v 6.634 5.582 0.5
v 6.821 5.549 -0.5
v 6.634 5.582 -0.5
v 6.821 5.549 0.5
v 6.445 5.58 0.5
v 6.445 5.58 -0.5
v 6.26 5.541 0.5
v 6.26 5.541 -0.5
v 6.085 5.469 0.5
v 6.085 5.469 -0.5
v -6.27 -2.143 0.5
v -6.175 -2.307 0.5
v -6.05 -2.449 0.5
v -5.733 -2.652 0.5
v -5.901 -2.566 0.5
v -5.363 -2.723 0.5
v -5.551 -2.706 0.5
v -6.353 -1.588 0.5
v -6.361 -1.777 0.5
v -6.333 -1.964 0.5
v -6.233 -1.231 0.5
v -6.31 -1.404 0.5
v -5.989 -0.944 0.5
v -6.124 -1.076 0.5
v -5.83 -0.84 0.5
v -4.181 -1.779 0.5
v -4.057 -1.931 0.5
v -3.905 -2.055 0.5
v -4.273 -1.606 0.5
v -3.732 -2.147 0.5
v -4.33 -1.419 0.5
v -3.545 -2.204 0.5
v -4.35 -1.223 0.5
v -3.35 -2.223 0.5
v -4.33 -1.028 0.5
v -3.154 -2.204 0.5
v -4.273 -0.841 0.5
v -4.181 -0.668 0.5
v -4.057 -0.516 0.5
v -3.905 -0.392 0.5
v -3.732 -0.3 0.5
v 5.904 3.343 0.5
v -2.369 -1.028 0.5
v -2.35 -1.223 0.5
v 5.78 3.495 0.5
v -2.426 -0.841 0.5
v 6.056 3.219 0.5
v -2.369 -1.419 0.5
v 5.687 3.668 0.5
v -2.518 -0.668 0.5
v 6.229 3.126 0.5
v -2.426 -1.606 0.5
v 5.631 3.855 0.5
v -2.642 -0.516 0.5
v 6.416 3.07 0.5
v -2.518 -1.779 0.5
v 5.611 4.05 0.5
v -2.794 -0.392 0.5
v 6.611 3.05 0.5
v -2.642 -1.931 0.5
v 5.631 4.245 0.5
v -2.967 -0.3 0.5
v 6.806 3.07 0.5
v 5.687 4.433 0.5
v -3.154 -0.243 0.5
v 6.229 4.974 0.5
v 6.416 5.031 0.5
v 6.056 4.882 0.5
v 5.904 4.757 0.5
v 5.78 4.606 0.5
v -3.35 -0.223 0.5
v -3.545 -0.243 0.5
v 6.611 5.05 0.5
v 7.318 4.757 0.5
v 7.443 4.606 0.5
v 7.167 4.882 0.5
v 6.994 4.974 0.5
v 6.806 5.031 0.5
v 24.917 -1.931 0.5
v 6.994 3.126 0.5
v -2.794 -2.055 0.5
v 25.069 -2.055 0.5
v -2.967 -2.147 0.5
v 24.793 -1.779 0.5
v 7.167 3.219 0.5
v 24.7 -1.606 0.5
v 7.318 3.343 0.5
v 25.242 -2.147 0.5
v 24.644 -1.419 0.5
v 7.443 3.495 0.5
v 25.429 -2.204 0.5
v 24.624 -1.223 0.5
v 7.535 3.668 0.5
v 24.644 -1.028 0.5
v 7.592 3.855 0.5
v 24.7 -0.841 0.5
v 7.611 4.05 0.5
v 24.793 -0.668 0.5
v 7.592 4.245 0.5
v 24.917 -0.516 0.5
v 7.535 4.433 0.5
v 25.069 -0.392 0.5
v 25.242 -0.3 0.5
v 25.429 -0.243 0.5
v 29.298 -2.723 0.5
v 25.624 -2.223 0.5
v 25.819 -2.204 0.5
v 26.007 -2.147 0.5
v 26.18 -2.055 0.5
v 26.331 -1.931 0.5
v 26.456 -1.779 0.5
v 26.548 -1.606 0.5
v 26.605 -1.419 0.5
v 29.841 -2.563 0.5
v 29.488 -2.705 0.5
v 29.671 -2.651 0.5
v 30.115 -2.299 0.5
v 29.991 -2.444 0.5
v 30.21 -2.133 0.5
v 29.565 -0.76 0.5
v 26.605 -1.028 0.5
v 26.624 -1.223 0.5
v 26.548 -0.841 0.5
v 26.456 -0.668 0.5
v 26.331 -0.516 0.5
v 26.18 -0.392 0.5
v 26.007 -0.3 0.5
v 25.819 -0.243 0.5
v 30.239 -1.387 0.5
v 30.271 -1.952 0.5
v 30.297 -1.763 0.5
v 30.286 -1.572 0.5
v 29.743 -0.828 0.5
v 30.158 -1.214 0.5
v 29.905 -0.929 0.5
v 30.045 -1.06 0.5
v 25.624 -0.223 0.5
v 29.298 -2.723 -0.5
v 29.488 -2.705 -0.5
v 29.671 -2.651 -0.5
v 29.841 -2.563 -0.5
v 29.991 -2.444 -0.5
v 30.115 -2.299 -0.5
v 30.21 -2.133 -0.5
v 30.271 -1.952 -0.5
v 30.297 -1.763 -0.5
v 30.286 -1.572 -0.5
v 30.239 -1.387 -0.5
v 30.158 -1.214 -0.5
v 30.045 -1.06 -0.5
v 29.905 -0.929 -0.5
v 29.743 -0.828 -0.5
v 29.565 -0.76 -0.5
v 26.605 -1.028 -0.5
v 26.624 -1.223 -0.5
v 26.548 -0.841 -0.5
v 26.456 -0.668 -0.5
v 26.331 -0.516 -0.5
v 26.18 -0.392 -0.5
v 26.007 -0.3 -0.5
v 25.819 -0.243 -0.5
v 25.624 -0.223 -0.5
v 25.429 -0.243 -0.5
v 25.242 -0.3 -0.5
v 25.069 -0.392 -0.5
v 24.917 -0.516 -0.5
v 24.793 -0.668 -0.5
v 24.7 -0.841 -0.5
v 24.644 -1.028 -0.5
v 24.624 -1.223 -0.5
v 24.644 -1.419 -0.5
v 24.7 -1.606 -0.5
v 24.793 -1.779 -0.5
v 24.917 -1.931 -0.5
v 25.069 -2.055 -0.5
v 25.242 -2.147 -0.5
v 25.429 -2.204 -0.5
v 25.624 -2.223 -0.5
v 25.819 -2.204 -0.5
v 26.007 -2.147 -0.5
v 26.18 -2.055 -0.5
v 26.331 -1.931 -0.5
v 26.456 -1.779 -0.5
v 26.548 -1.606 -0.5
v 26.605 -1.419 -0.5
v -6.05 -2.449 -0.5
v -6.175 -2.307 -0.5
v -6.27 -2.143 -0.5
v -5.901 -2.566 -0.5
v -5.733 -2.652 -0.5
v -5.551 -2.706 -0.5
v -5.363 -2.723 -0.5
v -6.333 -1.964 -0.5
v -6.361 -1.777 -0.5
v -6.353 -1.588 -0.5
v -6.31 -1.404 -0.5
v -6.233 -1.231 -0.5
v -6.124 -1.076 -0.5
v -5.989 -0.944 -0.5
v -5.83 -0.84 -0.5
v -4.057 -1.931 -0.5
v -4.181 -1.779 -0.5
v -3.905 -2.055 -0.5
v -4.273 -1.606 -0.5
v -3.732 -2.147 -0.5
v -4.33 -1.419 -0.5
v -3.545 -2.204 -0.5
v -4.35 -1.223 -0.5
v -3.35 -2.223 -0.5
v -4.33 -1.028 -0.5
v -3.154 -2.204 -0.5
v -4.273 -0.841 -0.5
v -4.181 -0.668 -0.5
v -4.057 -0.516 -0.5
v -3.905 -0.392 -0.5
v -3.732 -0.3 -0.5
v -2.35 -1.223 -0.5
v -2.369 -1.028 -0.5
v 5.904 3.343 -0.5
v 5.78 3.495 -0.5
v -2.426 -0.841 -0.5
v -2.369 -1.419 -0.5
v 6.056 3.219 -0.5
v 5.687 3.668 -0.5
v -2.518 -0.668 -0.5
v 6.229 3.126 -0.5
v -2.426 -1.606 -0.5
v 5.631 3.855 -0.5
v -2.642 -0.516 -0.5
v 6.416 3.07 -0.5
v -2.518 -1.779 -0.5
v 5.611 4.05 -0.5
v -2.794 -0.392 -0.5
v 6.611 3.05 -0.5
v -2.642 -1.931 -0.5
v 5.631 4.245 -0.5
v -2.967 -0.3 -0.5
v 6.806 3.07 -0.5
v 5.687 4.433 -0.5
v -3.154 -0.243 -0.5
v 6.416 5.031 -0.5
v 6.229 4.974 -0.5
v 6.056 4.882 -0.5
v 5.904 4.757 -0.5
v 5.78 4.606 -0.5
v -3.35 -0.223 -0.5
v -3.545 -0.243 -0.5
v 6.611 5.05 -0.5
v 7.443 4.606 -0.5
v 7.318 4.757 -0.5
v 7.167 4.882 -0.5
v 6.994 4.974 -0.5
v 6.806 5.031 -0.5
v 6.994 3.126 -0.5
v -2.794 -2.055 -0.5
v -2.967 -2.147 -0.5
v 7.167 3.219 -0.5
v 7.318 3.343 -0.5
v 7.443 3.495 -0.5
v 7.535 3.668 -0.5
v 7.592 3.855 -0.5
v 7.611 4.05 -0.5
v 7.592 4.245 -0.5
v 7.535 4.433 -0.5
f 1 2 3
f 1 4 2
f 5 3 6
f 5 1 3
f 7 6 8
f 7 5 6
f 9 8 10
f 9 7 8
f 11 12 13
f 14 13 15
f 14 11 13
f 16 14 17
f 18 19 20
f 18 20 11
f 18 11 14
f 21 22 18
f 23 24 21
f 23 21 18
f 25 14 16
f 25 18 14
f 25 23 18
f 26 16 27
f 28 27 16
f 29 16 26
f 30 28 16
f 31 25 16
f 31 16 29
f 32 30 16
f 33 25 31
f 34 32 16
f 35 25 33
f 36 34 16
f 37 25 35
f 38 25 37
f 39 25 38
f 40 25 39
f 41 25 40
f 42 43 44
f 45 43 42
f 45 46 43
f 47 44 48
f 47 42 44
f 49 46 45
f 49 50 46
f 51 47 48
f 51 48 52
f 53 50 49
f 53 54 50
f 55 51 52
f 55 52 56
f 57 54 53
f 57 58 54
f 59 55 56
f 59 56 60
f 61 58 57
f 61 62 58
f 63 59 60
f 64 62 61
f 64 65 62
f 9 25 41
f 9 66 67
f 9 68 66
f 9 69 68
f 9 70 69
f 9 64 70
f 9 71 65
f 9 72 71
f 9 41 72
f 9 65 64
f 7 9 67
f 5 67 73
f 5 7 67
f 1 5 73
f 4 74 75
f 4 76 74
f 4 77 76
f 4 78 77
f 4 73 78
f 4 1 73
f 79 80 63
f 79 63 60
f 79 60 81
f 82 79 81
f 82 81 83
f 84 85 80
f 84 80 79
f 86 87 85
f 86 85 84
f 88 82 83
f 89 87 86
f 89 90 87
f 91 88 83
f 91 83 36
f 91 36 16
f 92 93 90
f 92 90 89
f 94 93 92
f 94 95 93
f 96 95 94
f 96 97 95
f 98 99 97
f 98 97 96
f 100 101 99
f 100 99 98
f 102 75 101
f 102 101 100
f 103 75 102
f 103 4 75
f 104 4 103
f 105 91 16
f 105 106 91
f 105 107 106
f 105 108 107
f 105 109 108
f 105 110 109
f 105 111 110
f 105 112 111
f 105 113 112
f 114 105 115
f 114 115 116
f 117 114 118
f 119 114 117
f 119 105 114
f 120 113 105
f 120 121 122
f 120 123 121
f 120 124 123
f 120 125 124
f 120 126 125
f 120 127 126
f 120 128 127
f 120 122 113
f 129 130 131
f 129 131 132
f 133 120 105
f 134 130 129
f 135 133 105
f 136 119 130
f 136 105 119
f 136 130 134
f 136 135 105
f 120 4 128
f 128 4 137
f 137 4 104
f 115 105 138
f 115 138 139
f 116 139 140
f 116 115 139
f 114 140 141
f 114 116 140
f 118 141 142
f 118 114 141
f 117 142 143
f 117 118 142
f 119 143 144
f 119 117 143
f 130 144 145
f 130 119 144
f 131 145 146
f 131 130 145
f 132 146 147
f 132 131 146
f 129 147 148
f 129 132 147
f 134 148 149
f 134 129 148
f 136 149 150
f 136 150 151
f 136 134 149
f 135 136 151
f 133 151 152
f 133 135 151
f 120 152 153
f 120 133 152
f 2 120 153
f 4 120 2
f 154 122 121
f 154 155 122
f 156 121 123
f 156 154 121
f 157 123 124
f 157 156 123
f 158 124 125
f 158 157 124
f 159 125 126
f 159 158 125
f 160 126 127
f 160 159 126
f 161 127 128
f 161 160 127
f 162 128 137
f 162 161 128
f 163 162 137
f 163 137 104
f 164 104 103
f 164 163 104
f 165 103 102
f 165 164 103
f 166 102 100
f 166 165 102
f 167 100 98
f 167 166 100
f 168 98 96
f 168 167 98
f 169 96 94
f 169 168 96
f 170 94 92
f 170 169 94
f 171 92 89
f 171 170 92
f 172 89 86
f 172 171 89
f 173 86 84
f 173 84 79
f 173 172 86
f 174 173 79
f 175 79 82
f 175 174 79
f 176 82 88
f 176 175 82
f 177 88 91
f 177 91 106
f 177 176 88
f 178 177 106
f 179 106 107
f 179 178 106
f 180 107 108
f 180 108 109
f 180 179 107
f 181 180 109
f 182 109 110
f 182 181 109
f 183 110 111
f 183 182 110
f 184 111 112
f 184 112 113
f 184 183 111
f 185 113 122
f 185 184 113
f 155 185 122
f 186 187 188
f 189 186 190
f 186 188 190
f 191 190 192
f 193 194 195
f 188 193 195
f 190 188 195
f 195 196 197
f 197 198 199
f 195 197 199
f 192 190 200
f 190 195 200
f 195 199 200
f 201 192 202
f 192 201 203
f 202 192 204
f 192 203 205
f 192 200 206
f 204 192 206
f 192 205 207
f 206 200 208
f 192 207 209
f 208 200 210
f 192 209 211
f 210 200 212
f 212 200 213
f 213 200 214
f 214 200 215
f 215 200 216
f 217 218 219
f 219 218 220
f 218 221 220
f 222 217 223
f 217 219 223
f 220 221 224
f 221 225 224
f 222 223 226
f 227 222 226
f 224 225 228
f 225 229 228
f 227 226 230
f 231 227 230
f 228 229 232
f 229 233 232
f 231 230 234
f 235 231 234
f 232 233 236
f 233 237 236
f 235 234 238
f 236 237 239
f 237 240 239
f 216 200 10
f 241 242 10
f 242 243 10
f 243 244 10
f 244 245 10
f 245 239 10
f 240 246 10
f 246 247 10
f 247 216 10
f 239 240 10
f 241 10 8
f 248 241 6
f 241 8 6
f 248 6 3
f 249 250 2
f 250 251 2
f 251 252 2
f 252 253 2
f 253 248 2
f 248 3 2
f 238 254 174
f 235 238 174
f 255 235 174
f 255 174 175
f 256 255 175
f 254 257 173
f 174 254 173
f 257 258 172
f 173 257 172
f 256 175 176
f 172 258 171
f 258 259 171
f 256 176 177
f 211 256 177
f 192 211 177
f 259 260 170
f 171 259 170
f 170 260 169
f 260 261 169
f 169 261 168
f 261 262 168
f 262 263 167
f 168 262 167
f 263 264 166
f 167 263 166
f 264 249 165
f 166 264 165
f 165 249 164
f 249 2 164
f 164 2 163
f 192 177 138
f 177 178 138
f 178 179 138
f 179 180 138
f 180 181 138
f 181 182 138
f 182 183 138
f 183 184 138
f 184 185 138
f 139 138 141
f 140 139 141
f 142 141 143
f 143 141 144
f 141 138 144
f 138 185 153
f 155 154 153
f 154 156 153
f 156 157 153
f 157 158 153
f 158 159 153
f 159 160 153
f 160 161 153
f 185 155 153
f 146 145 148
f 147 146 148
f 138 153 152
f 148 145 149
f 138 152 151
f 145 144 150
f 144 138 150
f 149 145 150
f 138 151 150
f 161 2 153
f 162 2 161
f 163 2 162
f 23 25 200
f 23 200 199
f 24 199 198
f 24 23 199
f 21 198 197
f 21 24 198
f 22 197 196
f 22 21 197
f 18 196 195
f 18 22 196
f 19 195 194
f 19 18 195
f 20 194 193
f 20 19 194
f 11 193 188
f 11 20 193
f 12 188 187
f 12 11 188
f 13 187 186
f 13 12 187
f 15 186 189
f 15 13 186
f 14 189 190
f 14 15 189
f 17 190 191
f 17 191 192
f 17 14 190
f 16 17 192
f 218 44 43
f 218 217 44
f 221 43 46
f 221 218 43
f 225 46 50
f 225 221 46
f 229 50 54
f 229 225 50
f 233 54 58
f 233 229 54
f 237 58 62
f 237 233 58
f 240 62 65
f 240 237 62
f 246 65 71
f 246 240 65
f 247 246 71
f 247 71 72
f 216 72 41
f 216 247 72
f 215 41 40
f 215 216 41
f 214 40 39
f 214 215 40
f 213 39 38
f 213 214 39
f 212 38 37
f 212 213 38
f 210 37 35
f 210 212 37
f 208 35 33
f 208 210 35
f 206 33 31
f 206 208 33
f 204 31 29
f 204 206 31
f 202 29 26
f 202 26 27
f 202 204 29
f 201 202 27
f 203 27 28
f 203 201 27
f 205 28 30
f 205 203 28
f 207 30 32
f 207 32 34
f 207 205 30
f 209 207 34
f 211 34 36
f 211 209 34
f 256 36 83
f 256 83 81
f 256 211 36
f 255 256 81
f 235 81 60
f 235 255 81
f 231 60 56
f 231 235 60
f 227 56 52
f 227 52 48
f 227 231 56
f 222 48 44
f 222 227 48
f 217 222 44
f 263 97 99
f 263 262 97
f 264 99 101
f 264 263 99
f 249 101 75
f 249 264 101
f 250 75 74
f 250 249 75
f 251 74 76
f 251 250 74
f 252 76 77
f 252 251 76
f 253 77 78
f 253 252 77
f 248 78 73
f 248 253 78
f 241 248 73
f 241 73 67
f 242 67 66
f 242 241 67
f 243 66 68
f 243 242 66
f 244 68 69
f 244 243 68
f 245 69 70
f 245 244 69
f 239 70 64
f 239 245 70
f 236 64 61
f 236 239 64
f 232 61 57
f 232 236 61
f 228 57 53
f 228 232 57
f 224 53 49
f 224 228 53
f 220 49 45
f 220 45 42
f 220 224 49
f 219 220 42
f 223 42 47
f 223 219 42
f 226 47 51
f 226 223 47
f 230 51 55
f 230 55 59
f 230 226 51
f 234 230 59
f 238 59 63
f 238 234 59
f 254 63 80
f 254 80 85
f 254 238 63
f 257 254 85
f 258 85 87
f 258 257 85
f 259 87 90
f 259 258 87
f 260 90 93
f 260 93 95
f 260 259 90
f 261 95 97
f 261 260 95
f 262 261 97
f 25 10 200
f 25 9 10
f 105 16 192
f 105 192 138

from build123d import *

# Parameters (mm, degrees)
SKETCH1_R           = 1
BOSS_EXTRUDE1_DEPTH = 0.5


with BuildPart() as part:
    # Sketch1 → Boss-Extrude1 (new, symmetric)
    with BuildSketch(Plane.XY):
        with BuildLine():
            Line((6.085309509, 5.469141511), (-5.830437798, -0.839652689))
            ThreePointArc((-5.830437798, -0.839652689), (-6.333032181, -1.964493074), (-5.362523581, -2.723426577))
            Line((-5.362523581, -2.723426577), (29.297564453, -2.723426577))
            ThreePointArc((29.297564453, -2.723426577), (30.288426963, -1.858302391), (29.56485123, -0.759809547))
            Line((29.56485123, -0.759809547), (6.820510503, 5.548984653))
            ThreePointArc((6.820510503, 5.548984653), (6.44525811, 5.579522252), (6.085309509, 5.469141511))
        make_face()
        with Locations((6.611324324, 4.050373423)):
            Circle(SKETCH1_R, mode=Mode.SUBTRACT)
        with Locations((-3.349575676, -1.223426577)):
            Circle(SKETCH1_R, mode=Mode.SUBTRACT)
        with Locations((25.624324324, -1.223426577)):
            Circle(SKETCH1_R, mode=Mode.SUBTRACT)
    extrude(amount=BOSS_EXTRUDE1_DEPTH, both=True)


solid = part.part
